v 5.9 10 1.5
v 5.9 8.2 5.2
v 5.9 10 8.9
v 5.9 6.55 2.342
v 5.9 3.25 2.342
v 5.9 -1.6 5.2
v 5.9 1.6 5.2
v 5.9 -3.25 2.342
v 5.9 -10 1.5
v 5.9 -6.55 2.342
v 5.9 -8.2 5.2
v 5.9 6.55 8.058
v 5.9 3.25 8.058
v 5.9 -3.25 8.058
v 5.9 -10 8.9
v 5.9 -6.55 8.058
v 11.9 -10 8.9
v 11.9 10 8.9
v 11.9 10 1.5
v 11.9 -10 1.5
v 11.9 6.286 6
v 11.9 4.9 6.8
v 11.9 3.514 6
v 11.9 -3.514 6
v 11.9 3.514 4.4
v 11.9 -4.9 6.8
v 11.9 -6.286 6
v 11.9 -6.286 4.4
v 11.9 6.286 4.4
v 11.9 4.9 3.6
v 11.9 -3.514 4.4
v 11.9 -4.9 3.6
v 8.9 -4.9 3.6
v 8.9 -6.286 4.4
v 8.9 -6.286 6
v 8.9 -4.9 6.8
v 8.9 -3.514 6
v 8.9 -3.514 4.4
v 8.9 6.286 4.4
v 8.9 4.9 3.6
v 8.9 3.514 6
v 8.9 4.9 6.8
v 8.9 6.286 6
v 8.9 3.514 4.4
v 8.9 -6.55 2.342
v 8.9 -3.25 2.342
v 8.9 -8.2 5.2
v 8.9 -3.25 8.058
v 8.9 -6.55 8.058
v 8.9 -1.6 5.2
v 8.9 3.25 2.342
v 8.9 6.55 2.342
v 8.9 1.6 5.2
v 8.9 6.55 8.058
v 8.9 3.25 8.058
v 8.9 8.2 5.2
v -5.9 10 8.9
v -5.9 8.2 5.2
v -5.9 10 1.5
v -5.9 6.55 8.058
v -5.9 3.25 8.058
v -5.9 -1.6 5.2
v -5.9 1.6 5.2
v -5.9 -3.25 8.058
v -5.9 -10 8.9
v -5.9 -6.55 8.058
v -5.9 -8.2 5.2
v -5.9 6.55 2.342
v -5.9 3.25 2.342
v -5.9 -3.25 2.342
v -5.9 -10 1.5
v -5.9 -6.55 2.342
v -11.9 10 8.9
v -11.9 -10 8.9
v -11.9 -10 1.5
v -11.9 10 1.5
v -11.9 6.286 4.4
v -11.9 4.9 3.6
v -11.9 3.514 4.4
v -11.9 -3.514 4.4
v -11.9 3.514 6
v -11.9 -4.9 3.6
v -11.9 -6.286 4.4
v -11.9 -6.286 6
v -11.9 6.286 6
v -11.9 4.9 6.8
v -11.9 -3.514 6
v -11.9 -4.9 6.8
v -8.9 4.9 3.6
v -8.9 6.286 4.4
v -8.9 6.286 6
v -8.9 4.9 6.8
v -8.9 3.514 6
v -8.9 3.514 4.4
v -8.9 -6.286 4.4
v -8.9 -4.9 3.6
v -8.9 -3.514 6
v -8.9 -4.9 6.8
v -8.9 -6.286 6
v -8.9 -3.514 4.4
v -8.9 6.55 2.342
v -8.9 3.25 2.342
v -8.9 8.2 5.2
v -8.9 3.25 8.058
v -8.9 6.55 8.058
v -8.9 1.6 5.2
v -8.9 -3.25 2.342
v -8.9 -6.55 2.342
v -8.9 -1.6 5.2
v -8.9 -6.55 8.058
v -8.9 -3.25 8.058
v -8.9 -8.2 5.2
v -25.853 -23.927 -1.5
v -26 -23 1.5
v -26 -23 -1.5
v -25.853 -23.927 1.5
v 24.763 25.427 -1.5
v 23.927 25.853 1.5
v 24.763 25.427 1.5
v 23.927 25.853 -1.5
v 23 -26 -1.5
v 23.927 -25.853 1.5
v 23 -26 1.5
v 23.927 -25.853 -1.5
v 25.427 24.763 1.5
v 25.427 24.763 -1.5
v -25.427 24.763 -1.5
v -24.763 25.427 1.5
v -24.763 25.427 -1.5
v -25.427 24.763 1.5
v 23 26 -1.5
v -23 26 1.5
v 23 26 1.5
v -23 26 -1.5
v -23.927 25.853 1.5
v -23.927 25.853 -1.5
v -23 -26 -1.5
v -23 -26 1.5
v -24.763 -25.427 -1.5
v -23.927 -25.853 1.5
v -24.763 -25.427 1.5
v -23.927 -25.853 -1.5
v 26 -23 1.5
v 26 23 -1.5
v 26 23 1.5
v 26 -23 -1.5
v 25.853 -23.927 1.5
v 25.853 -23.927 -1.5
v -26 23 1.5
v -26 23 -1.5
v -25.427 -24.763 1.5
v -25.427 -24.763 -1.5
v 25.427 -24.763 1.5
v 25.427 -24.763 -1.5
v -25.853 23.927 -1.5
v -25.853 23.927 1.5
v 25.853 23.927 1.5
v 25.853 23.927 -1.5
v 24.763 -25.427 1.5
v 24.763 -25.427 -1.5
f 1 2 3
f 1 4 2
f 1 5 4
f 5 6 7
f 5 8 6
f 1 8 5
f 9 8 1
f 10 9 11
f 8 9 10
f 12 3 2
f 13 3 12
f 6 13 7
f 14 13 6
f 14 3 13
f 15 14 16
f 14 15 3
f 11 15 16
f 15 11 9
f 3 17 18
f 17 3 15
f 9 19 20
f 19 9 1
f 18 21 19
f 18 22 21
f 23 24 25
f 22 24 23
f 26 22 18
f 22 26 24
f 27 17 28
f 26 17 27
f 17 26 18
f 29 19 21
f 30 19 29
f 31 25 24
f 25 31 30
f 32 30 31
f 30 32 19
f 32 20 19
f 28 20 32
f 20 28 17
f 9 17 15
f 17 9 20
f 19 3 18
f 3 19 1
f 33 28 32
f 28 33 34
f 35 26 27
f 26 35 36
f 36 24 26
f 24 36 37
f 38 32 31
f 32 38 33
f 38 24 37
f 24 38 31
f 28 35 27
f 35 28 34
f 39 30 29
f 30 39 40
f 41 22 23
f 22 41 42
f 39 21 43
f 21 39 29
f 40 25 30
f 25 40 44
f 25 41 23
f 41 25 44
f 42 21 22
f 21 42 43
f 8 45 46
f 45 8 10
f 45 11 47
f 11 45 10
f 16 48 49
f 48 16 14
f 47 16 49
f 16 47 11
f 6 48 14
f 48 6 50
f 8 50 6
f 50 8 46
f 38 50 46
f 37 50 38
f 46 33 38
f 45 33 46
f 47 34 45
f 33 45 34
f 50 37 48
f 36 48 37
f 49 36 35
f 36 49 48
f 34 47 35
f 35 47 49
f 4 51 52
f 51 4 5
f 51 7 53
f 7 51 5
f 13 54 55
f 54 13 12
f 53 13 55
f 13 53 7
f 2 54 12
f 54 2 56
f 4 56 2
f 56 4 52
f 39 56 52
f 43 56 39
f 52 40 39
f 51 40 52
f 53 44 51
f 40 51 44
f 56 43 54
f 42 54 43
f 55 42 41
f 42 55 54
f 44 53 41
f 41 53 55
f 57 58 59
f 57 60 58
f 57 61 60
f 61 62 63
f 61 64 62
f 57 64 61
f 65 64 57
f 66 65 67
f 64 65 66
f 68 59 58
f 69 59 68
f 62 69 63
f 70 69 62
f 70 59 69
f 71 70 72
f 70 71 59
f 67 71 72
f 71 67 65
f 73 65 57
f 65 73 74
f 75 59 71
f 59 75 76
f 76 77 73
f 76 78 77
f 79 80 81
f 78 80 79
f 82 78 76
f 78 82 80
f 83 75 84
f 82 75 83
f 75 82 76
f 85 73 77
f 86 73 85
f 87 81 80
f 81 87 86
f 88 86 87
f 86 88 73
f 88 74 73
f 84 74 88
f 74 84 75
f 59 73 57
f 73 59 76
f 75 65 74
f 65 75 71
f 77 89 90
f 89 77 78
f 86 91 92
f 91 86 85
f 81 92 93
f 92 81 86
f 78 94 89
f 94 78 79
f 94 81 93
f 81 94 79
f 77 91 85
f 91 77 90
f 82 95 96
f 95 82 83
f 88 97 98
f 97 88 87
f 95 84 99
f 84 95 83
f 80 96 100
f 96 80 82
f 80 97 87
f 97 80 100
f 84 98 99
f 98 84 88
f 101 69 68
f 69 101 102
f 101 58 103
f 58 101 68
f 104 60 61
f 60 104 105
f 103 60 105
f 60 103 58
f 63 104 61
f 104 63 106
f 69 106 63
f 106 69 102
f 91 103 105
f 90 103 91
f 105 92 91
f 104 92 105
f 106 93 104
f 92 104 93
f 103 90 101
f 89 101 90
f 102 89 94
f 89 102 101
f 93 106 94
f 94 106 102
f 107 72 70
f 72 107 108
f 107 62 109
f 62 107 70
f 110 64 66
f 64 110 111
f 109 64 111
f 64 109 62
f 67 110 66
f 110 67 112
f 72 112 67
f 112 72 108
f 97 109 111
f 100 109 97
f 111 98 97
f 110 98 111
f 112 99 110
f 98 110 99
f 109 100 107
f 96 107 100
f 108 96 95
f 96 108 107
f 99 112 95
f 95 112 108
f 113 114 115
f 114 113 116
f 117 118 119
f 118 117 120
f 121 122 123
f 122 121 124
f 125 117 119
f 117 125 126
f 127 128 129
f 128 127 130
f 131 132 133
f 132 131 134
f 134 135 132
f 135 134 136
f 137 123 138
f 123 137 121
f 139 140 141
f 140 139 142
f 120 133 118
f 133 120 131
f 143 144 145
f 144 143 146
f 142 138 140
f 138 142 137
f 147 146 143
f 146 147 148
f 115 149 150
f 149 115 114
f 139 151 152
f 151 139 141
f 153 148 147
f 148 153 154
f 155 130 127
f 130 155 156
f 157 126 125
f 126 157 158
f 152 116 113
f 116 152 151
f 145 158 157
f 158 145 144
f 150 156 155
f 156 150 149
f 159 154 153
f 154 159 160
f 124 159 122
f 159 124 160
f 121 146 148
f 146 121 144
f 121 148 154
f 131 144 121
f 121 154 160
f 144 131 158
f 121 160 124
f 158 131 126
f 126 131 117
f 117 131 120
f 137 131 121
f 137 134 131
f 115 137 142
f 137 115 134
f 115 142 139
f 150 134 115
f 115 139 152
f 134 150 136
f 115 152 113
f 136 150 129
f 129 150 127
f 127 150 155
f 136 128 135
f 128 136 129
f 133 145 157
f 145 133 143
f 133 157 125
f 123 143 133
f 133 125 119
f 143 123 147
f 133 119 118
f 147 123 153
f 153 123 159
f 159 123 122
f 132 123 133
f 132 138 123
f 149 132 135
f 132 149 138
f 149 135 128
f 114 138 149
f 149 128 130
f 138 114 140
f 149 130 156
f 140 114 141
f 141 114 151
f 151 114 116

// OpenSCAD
// file: obiscad/bcube.scad
//------------------------------------------------------------------------------
//  Bevel edge cube.
//  (c) Juan Gonzalez-Gomez (Obijuan), Sep-2012
//------------------------------------------------------------------------------

//----------------- IMPLEMENTATION USING THE MINKOWSKI OPERATOR ----------------

//------------------------------------------------------------------------------
//-- Bevel Cube main function
//-- Parameters:
//--   * Size:  Cube size
//--   * cr : Corner radius (if cr==0, a standar cube is built)
//--   * cres:  Corner resolution (in points). cres=0 means flat corners
//------------------------------------------------------------------------------
module bcube(size,cr=0,cres=0)
{
  //-- Internal cube size
  bsize = size - 2*[cr,cr,0];

  //-- Get the (x,y) coorner coordinates in the 1st cuadrant
  x = bsize[0]/2;
  y = bsize[1]/2;

  //-- A corner radius of 0 means a standar cube!
  if (cr==0)
    cube(bsize,center=true);
  else {

      
      //-- The height of minkowski object is double. So
      //-- we sould scale by 0.5
      scale([1,1,0.5])

      //-- This translation is for centering the minkowski objet
      translate([-x, -y,0])

      //-- Built the  beveled cube with minkowski
      minkowski() {

        //-- Internal cube
        cube(bsize,center=true);

        //-- Cylinder in the corner (1st cuadrant)
        translate([x,y, 0])
          cylinder(r=cr, h=bsize[2],center=true, $fn=4*(cres+1));
      }
  }

}


//-- Examples of use of the bcube() module

//-- Standar cube
translate([-15,15,0])
bcube([20,20,10]);

//-- Beveled cube (0 point resolution)
translate([15,15,0])
  bcube([20,20,10],cr=4);

//-- Beveled cube (1 point resolution)
translate([-15,-15,0])
  bcube([20,20,10],cr=4, cres=1);

//-- Beveled cube (4 points resolution)
translate([15,-15,0])
  bcube([20,20,10],cr=4, cres=4);
// main file
use <obiscad/bcube.scad>

X = 0;
Y = 1;
Z = 2;

//----------------- USER parameters ------------------
base_side = 52;
base_th = 3;
base_cr = 3;
base_cres = 4;

ear_lx = 23.8;
ear_lz = 7.4;

foot_th = 6;
foot_size = [foot_th, 20, ear_lz];

foot_drill_diam = 3.2;

//-- Distance between the center of the two
//-- foot drills
foot_drill_dx = 6.6 + foot_drill_diam;

//---- DATA calculation
base_size = [base_side, base_side, base_th];

//-- Distance in x between the two feet
feet_dx = ear_lx - 2 * foot_th;

//-- Feet location coordinates
foot_pos = [foot_size[X]/2 + feet_dx/2,
            0,
            foot_size[Z]/2 + base_size[Z]/2];

//-- captive Nuts
nut_h = 3;
nut_radius = 6.6/2;            
            
extra = 5;            

module foot()
{

  nut_co = nut_h + extra;

  difference() {
    //-- Main foot body
    cube(foot_size, center = true);
    
    //-- Foot drills
    translate([0, foot_drill_dx/2, 0])
    rotate([0, 90, 0])
    cylinder(r = foot_drill_diam/2, h = foot_size[X] + extra, center = true);

    translate([0, -foot_drill_dx/2, 0])
    rotate([0, 90, 0])
    cylinder(r = foot_drill_diam/2, h = foot_size[X] + extra, center = true);
    
    //-- Embebed nuts
    translate([nut_co/2 + foot_size[X]/2 - nut_h,
               foot_drill_dx/2,
                0])
     rotate([0,90,0])
     rotate([0,0,90])
     cylinder(r = nut_radius, h = nut_co, center = true, $fn=6);
 
     translate([nut_co/2 + foot_size[X]/2 - nut_h,
               -foot_drill_dx/2,
                0])
     rotate([0,90,0])
     rotate([0,0,90])
     cylinder(r = nut_radius, h = nut_co, center = true, $fn=6);
    
  }  
}
 
//foot(); 


 
//--------- PART building -----------------

//-- The base
bcube(base_size, cr = base_cr, cres = base_cres);

//-- The feet

//-- Right foot
translate(foot_pos)
rotate([0,0,180])
foot();

//-- Left foot
translate([-foot_pos[X], foot_pos[Y], foot_pos[Z]])
foot();



//--- Things TODO
//-- * drills and nuts.. a little bit closer to the base (lower)
//-- * Skymega drills
//-- * Feet reinforcements
//-- * Internal cutout
//-- * external cutouts
